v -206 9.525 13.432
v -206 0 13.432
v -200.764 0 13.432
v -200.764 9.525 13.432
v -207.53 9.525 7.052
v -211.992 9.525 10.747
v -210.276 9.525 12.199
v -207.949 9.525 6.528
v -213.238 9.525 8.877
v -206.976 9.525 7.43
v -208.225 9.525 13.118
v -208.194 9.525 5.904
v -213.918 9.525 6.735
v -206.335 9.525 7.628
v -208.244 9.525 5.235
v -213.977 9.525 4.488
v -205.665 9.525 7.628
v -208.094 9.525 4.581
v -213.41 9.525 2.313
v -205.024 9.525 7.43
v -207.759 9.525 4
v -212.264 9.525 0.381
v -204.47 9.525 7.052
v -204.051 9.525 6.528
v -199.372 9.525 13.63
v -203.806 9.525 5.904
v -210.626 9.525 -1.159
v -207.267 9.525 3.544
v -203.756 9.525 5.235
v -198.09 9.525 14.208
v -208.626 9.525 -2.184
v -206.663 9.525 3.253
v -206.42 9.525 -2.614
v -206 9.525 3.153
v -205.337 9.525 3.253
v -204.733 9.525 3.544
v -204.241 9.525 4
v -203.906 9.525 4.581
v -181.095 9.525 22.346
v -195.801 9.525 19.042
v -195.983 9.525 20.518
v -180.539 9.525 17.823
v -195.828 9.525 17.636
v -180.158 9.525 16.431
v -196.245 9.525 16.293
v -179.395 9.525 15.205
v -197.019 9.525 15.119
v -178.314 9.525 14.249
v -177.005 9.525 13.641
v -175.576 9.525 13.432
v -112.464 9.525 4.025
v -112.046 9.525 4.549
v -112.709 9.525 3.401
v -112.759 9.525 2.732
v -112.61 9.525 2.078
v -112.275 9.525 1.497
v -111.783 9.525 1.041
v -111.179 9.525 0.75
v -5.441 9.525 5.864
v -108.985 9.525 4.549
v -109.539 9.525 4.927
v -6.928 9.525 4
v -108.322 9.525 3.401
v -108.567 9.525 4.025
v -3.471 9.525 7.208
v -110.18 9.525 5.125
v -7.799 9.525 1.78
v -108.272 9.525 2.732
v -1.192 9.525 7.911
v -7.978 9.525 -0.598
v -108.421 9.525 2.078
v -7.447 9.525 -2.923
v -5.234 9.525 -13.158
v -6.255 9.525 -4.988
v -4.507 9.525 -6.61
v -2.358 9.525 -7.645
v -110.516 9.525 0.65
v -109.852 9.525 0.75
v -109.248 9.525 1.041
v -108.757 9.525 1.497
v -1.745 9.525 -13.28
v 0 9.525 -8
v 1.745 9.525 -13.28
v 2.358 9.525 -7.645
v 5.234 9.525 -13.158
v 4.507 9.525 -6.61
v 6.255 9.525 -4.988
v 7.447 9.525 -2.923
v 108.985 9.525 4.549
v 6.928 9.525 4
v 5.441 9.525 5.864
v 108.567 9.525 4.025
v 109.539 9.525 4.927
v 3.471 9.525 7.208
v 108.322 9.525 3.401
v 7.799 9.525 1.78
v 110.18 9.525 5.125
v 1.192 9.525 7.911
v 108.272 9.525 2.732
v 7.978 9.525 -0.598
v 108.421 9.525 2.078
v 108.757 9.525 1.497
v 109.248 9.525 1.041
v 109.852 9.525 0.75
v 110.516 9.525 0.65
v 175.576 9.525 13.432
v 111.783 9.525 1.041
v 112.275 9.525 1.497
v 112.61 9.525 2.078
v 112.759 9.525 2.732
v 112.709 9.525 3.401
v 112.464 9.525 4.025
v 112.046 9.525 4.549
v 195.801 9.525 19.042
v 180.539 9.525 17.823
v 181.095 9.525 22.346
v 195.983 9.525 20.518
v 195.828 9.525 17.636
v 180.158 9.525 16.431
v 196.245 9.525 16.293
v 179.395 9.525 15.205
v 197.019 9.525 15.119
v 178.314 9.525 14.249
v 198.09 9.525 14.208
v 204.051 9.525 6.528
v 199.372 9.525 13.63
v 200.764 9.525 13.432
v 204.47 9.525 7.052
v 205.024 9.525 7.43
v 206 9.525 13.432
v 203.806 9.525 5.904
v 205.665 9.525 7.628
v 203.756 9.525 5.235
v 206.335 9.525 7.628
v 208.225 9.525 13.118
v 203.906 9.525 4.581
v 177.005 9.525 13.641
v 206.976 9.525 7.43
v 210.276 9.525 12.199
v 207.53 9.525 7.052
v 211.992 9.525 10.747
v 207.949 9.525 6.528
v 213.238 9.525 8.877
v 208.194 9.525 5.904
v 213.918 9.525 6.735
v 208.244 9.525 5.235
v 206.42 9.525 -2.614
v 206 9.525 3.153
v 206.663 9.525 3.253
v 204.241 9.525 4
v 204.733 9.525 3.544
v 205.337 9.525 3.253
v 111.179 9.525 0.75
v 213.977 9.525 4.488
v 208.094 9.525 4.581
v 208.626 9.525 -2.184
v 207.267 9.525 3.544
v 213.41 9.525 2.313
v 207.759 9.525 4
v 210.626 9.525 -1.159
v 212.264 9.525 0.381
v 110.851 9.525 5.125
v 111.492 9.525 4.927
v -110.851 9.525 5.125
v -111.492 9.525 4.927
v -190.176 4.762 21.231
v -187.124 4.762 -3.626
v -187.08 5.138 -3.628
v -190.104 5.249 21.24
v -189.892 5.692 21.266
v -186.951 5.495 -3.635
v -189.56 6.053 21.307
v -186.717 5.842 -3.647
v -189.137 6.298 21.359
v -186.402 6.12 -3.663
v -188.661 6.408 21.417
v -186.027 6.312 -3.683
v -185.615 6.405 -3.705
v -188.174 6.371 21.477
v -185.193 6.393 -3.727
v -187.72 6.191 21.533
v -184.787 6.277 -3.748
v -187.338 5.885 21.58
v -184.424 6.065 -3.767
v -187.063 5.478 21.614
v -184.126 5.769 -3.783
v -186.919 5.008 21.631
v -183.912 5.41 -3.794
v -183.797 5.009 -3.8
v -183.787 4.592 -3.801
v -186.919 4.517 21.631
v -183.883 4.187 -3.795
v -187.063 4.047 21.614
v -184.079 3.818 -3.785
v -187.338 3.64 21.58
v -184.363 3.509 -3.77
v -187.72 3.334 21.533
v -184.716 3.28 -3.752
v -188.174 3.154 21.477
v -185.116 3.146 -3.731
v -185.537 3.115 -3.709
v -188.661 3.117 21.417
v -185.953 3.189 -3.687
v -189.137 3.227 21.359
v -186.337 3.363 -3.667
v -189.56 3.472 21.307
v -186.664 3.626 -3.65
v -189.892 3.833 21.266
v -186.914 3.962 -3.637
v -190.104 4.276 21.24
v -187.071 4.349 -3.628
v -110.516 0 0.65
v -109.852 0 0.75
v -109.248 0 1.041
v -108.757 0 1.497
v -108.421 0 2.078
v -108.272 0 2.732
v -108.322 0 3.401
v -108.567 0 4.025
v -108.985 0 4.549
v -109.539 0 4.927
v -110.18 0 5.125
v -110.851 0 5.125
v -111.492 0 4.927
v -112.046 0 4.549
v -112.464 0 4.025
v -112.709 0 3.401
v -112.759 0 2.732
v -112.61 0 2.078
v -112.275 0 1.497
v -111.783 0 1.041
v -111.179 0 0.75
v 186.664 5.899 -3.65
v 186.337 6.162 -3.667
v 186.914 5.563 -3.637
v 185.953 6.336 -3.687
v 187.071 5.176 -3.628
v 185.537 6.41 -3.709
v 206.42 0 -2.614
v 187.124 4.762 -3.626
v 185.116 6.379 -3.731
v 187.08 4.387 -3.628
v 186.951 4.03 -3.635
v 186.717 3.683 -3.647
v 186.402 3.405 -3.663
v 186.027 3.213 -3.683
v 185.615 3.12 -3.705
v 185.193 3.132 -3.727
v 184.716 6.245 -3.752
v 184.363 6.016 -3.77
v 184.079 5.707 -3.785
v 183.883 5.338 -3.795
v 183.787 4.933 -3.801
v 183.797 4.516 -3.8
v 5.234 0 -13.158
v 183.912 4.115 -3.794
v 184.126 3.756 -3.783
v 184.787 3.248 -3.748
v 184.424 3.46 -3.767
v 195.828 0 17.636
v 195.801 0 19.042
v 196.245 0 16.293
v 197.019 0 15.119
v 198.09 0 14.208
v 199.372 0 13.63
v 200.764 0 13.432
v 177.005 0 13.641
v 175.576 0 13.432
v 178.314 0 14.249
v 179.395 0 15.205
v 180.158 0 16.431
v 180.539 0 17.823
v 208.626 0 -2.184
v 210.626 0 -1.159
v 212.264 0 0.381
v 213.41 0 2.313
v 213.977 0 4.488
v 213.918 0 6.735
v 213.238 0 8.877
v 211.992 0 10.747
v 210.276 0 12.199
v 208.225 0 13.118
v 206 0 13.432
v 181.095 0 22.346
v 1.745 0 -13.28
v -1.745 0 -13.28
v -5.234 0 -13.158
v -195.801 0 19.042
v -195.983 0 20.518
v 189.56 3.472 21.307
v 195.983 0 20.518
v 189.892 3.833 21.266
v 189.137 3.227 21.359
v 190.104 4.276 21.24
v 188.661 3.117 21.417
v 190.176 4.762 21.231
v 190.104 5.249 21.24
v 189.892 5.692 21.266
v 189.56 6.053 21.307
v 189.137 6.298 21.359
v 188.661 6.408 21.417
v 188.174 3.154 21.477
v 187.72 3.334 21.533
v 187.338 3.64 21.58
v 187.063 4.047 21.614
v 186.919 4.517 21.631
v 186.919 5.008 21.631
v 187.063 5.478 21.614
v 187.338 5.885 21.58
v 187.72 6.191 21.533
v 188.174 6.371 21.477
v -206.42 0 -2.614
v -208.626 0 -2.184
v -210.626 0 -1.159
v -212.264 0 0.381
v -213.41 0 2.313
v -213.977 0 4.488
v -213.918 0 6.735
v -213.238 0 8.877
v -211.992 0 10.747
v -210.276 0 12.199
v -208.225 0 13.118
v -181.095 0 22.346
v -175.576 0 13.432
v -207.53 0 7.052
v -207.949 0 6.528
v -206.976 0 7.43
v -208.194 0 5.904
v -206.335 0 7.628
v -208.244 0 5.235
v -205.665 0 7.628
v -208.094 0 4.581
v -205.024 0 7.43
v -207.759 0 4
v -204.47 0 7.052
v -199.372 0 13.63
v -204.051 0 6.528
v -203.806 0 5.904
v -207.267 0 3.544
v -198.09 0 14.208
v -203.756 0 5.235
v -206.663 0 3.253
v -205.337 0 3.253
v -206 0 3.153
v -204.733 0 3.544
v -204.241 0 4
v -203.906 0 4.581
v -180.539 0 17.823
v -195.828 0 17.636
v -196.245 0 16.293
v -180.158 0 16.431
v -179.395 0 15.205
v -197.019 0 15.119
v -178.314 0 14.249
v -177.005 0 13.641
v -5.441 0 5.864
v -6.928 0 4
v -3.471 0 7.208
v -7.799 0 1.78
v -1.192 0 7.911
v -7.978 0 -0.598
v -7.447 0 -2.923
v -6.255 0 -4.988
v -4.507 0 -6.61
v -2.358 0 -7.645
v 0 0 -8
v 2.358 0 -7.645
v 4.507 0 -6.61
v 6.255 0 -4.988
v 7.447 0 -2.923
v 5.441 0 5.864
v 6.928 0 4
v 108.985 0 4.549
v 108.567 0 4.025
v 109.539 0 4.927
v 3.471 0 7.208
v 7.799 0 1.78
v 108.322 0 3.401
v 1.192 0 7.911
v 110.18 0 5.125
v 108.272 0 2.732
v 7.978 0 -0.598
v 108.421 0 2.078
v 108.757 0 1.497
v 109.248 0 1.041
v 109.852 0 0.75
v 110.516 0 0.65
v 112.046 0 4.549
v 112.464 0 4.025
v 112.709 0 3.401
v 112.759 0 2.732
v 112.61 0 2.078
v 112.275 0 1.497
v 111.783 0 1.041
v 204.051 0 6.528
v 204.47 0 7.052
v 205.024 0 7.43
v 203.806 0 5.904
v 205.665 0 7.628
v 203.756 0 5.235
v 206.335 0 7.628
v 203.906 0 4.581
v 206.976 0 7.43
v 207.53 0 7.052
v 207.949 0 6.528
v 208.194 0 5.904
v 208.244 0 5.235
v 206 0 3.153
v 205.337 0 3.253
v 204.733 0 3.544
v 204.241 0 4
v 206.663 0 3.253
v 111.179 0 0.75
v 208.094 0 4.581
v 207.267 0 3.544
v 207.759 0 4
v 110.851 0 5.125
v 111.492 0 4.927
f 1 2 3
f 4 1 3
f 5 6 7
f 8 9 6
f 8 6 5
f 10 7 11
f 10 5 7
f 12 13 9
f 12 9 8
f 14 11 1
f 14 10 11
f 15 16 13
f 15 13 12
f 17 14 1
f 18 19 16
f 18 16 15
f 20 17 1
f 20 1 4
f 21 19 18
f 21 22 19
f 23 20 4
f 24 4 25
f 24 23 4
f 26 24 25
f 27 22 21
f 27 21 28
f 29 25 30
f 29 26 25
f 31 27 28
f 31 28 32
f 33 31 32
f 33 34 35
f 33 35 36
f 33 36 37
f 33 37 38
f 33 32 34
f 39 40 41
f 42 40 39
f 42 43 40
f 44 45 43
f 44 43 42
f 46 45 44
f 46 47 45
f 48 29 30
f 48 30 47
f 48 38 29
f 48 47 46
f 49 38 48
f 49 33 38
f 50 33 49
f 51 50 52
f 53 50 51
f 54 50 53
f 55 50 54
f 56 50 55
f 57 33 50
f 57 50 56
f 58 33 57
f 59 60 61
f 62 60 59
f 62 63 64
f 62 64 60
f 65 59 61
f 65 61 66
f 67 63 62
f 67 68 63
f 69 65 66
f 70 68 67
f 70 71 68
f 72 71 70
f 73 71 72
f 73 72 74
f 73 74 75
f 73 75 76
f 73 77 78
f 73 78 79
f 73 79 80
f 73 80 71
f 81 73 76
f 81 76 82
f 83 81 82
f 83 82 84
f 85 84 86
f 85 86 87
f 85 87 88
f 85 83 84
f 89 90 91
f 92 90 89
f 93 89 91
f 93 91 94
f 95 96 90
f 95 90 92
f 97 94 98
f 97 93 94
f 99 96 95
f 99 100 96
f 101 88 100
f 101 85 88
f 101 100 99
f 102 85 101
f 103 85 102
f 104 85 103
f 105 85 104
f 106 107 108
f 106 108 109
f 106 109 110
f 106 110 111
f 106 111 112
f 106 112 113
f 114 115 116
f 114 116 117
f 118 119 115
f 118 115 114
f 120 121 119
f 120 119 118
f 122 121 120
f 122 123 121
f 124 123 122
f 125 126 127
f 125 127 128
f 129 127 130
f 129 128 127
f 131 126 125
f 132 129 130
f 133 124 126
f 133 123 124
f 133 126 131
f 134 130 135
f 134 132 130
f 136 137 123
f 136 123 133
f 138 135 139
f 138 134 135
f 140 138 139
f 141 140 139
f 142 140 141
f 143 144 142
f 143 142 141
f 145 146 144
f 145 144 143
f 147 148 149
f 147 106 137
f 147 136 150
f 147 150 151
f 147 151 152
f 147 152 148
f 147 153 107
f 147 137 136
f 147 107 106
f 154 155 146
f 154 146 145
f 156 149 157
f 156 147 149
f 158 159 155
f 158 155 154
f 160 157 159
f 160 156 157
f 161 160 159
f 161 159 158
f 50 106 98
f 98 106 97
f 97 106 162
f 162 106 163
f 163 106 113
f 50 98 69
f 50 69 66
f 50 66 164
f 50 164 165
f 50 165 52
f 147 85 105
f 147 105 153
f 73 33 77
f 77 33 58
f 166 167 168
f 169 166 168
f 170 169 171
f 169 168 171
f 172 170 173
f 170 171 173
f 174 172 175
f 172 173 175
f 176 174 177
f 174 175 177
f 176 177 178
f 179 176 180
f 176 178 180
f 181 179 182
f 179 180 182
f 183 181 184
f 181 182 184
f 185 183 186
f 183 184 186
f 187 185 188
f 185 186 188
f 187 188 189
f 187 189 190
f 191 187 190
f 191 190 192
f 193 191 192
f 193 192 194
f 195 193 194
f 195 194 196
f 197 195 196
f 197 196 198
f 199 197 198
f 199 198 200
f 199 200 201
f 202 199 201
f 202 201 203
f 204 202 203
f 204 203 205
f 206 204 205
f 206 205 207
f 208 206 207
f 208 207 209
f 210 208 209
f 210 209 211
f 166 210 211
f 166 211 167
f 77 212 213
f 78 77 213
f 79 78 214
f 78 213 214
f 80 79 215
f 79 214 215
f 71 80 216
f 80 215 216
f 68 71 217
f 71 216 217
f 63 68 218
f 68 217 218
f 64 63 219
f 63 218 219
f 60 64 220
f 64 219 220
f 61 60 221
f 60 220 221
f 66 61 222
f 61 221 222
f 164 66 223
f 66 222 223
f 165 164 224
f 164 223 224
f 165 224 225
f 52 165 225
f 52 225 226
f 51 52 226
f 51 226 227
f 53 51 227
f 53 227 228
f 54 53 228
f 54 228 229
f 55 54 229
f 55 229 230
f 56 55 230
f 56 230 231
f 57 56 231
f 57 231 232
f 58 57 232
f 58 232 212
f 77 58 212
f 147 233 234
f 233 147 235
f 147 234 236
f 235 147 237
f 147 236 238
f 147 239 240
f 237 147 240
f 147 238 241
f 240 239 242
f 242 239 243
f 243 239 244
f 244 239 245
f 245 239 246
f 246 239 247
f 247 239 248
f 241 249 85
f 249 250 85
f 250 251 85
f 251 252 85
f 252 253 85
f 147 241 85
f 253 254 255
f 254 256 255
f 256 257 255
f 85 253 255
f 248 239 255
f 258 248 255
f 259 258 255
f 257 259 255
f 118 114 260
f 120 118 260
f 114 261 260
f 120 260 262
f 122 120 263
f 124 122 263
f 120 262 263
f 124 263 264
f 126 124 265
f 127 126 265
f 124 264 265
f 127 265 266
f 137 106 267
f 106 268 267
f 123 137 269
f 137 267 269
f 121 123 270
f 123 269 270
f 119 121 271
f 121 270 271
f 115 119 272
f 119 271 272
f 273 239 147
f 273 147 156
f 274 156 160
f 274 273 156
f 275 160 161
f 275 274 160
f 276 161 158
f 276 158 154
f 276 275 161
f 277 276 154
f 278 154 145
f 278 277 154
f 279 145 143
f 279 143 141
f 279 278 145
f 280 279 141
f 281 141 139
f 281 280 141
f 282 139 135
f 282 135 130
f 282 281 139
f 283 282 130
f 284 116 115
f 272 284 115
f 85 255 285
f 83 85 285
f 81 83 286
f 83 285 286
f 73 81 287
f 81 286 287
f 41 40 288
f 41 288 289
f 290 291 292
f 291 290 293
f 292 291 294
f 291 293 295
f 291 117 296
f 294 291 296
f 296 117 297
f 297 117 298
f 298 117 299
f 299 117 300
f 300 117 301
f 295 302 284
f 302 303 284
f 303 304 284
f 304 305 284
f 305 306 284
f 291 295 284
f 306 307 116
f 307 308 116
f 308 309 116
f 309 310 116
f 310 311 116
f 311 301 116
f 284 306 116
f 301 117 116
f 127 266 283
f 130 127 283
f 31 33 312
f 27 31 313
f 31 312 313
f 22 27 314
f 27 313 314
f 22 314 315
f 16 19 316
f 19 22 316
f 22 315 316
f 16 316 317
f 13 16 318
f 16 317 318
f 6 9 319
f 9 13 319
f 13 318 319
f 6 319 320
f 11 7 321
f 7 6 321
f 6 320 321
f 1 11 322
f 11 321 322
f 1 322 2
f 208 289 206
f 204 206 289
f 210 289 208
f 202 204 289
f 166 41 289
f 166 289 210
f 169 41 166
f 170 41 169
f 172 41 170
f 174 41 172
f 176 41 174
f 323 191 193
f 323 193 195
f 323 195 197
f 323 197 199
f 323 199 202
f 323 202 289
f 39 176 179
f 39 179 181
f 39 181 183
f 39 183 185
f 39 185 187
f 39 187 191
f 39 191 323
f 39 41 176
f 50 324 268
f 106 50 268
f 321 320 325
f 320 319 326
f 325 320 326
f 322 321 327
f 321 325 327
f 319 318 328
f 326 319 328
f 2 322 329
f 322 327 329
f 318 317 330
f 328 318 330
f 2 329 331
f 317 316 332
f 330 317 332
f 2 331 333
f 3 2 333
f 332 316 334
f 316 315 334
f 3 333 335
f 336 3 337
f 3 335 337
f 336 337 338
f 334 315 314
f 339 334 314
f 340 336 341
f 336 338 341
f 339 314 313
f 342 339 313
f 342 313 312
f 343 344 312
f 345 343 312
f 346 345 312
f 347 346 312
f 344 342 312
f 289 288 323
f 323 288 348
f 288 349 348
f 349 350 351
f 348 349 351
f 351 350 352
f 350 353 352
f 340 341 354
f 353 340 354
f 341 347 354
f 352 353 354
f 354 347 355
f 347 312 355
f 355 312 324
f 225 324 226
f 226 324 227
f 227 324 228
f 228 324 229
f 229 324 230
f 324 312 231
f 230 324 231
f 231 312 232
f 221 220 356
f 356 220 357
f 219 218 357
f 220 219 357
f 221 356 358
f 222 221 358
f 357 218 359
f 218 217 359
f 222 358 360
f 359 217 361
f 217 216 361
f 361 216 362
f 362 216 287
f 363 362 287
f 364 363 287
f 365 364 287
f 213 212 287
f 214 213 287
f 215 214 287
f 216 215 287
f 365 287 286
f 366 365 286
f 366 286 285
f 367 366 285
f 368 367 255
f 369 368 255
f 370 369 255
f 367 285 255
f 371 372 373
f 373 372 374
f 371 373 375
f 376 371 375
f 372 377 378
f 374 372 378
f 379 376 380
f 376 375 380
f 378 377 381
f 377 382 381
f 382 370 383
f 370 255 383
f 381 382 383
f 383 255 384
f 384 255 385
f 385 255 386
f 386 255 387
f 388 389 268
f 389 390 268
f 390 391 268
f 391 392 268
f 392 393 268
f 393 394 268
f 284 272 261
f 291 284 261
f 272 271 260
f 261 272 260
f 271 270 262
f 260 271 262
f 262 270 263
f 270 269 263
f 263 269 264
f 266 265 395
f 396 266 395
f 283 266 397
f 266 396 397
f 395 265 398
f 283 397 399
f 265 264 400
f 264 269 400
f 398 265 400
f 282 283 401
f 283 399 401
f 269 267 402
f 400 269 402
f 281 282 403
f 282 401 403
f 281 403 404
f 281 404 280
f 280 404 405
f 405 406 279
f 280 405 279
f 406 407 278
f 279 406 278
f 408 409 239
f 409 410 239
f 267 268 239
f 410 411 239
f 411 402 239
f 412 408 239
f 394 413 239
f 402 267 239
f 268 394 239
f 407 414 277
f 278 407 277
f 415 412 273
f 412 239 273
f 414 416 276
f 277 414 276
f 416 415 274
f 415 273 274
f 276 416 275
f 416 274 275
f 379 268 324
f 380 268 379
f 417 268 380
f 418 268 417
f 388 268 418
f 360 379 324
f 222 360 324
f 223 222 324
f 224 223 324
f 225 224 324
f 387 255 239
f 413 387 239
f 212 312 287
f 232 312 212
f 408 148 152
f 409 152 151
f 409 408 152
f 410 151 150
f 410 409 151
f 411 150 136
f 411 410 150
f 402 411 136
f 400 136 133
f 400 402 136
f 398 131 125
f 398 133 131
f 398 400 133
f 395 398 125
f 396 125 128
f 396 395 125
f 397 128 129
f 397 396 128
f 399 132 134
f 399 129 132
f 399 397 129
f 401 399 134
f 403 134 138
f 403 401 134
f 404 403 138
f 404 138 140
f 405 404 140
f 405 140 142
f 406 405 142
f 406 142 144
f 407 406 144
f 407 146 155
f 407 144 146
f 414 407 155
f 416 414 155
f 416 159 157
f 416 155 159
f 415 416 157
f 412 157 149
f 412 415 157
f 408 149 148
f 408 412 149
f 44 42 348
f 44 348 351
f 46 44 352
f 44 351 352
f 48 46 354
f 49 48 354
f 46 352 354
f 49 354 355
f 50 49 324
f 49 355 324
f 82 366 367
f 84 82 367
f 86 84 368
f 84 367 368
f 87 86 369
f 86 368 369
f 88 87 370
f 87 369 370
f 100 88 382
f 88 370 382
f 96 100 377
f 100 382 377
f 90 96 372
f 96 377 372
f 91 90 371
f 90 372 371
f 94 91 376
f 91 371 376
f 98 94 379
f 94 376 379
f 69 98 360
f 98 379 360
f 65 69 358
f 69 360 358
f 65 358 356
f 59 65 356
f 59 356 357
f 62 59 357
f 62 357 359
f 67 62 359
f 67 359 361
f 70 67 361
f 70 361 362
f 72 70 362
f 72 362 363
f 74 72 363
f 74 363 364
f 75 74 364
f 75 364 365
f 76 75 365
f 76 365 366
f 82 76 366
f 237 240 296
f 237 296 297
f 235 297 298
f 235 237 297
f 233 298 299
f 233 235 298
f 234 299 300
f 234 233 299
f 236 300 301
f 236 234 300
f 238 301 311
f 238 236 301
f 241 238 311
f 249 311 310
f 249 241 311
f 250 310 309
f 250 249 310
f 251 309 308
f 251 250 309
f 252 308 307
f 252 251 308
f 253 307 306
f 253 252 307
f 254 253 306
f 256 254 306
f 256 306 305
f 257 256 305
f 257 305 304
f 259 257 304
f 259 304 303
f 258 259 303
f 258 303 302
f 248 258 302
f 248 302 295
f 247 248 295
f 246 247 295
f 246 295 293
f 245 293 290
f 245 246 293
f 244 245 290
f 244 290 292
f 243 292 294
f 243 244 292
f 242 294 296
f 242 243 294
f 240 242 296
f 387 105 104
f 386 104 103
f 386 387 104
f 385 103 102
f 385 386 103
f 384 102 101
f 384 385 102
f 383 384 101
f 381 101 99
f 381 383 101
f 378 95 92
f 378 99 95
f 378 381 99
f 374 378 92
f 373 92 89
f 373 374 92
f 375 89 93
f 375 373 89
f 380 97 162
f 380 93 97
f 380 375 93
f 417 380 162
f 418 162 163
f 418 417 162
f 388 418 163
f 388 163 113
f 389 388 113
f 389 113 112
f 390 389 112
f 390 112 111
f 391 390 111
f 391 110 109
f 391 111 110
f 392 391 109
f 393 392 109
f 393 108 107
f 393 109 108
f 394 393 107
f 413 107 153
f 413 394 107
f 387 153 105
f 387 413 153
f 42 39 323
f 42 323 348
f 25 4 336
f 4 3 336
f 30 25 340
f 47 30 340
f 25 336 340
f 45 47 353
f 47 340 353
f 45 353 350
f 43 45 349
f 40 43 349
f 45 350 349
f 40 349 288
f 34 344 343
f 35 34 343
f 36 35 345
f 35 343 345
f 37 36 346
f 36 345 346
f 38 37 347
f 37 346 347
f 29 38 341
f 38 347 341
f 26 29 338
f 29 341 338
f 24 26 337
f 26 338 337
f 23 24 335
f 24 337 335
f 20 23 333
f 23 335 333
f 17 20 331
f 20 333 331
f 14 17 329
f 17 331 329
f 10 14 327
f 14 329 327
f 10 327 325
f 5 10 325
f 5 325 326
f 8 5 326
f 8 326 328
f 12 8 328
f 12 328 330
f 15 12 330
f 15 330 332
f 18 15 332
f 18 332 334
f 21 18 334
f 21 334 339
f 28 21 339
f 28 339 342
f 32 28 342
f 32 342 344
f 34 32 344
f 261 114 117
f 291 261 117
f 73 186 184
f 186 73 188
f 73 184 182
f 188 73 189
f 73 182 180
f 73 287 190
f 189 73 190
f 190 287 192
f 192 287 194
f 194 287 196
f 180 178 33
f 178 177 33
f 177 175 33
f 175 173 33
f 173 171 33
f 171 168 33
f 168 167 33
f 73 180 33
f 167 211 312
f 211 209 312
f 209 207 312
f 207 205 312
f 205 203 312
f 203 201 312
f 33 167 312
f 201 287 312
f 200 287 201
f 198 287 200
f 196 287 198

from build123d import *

# Parameters (mm, degrees)
STOCK_UOR22_CNS_5_P_007_SWING_ARM_PLATE_START = -3.175
STOCK_UOR22_CNS_5_P_007_SWING_ARM_PL_2_R      = 2.9
STOCK_UOR22_CNS_5_P_007_SWING_ARM_PL_2_R_2    = 2.25
STOCK_UOR22_CNS_5_P_007_SWING_ARM_PL_2_R_3    = 8
STOCK_UOR22_CNS_5_P_007_SWING_ARM_PLATE_DEPTH = 3.175
BOSS_EXTRUDE2_DEPTH                           = 9.525
SKETCH5_R                                     = 8
CUT_EXTRUDE1_DEPTH                            = 235.085039959
SKETCH7_R                                     = 2.25
CUT_EXTRUDE3_DEPTH                            = 235.085039959
CUT_EXTRUDE2_DEPTH                            = 235.085039959
BOSS_EXTRUDE5_DEPTH                           = 9.525
M4_TAPPED_HOLE1_D                             = 3.3
FILLET4_R                                     = 5
FILLET4_OF_MIRROR7_R                          = 5


# Read off the part's stored shape, not the designer's step: Stock-UOR22-CNS-5-P-007_Swing_arm_plate-1
with BuildPart() as part:
    # Stock-UOR22-CNS-5-P-007_Swing_arm_pl 2 → Stock-UOR22-CNS-5-P-007_Swing_arm_plate-1 (new body)
    with BuildSketch(Plane(origin=(0, 0, 0), x_dir=(1, 0, 0), z_dir=(0, 1, 0)).offset(STOCK_UOR22_CNS_5_P_007_SWING_ARM_PLATE_START)):
        with BuildLine():
            ThreePointArc((226, -13.432371654), (233.502570944, -6.12369062), (226.392788824, 1.567628346))
            Line((226.392788824, 1.567628346), (5.233595624, 13.15809053))
            ThreePointArc((5.233595624, 13.15809053), (0, 13.295137054), (-5.233595624, 13.15809053))
            Line((-5.233595624, 13.15809053), (-226.392788824, 1.567628346))
            ThreePointArc((-226.392788824, 1.567628346), (-233.502570944, -6.12369062), (-226, -13.432371654))
            Line((-226, -13.432371654), (226, -13.432371654))
        make_face()
        with Locations((-226, -5.927228885)):
            Circle(STOCK_UOR22_CNS_5_P_007_SWING_ARM_PL_2_R, mode=Mode.SUBTRACT)
        with Locations((-206, -5.40297223)):
            Circle(STOCK_UOR22_CNS_5_P_007_SWING_ARM_PL_2_R_2, mode=Mode.SUBTRACT)
        with BuildLine():
            ThreePointArc((-200.009372106, -5.067744788), (-199.5011525, -3.620374273), (-198.117168054, -2.958743238))
            Line((-198.117168054, -2.958743238), (-118.332872644, 1.222574507))
            ThreePointArc((-118.332872644, 1.222574507), (-116.669449692, 0.478429636), (-116.300073603, -1.306027932))
            ThreePointArc((-116.300073603, -1.306027932), (-116.513571396, -3.059574073), (-116.207168794, -4.799293251))
            ThreePointArc((-116.207168794, -4.799293251), (-116.481651343, -6.601525877), (-118.104327652, -7.432371654))
            Line((-118.104327652, -7.432371654), (-198.000054021, -7.432371654))
            ThreePointArc((-198.000054021, -7.432371654), (-199.416863766, -6.843984258), (-200.000040515, -5.425021798))
            ThreePointArc((-200.000040515, -5.425021798), (-200.002045504, -5.246313796), (-200.009372106, -5.067744788))
        make_face(mode=Mode.SUBTRACT)
        with Locations((-110.515692218, -2.900058041)):
            Circle(STOCK_UOR22_CNS_5_P_007_SWING_ARM_PL_2_R_2, mode=Mode.SUBTRACT)
        with BuildLine():
            ThreePointArc((-15.423577727, 6.615822121), (-13.745275303, 5.852940228), (-13.404042587, 4.04124267))
            ThreePointArc((-13.404042587, 4.04124267), (-13.994975846, -0.375034774), (-13.168367384, -4.753325197))
            ThreePointArc((-13.168367384, -4.753325197), (-13.412783431, -6.581699085), (-15.049562725, -7.432371654))
            Line((-15.049562725, -7.432371654), (-102.927056783, -7.432371654))
            ThreePointArc((-102.927056783, -7.432371654), (-104.549733092, -6.601525877), (-104.824215641, -4.799293251))
            ThreePointArc((-104.824215641, -4.799293251), (-104.5176845, -2.745450719), (-104.929619796, -0.710127699))
            ThreePointArc((-104.929619796, -0.710127699), (-104.748793796, 1.103164739), (-103.172267568, 2.017108151))
            Line((-103.172267568, 2.017108151), (-15.423577727, 6.615822121))
        make_face(mode=Mode.SUBTRACT)
        with Locations((110.515692218, -2.900058041)):
            Circle(STOCK_UOR22_CNS_5_P_007_SWING_ARM_PL_2_R_2, mode=Mode.SUBTRACT)
        with BuildLine():
            Line((15.423577727, 6.615822121), (103.172267568, 2.017108151))
            ThreePointArc((103.172267568, 2.017108151), (104.748793796, 1.103164739), (104.929619796, -0.710127699))
            ThreePointArc((104.929619796, -0.710127699), (104.5176845, -2.745450719), (104.824215641, -4.799293251))
            ThreePointArc((104.824215641, -4.799293251), (104.549733092, -6.601525877), (102.927056783, -7.432371654))
            Line((102.927056783, -7.432371654), (15.049562725, -7.432371654))
            ThreePointArc((15.049562725, -7.432371654), (13.412783431, -6.581699085), (13.168367384, -4.753325197))
            ThreePointArc((13.168367384, -4.753325197), (13.994975846, -0.375034774), (13.404042587, 4.04124267))
            ThreePointArc((13.404042587, 4.04124267), (13.745275303, 5.852940228), (15.423577727, 6.615822121))
        make_face(mode=Mode.SUBTRACT)
        with Locations((226, -5.927228885)):
            Circle(STOCK_UOR22_CNS_5_P_007_SWING_ARM_PL_2_R, mode=Mode.SUBTRACT)
        with Locations((206, -5.40297223)):
            Circle(STOCK_UOR22_CNS_5_P_007_SWING_ARM_PL_2_R_2, mode=Mode.SUBTRACT)
        with BuildLine():
            Line((118.332872644, 1.222574507), (198.117168054, -2.958743238))
            ThreePointArc((198.117168054, -2.958743238), (199.5011525, -3.620374273), (200.009372106, -5.067744788))
            ThreePointArc((200.009372106, -5.067744788), (200.002045504, -5.246313796), (200.000040515, -5.425021798))
            ThreePointArc((200.000040515, -5.425021798), (199.416863766, -6.843984258), (198.000054021, -7.432371654))
            Line((198.000054021, -7.432371654), (118.104327652, -7.432371654))
            ThreePointArc((118.104327652, -7.432371654), (116.481651343, -6.601525877), (116.207168794, -4.799293251))
            ThreePointArc((116.207168794, -4.799293251), (116.513571396, -3.059574073), (116.300073603, -1.306027932))
            ThreePointArc((116.300073603, -1.306027932), (116.669449692, 0.478429636), (118.332872644, 1.222574507))
        make_face(mode=Mode.SUBTRACT)
        Circle(STOCK_UOR22_CNS_5_P_007_SWING_ARM_PL_2_R_3, mode=Mode.SUBTRACT)
    extrude(amount=STOCK_UOR22_CNS_5_P_007_SWING_ARM_PLATE_DEPTH)


with BuildPart() as body_2:
    # Sketch3 → Boss-Extrude2 (new body)
    with BuildSketch(Plane(origin=(0, 0, 0), x_dir=(1, 0, 0), z_dir=(0, 1, 0))):
        with BuildLine():
            Line((226.392788824, 1.567628346), (5.233595624, 13.15809053))
            ThreePointArc((5.233595624, 13.15809053), (0, 13.295137054), (-5.233595624, 13.15809053))
            Line((-5.233595624, 13.15809053), (-226.392788824, 1.567628346))
            ThreePointArc((-226.392788824, 1.567628346), (-233.502570944, -6.12369062), (-226, -13.432371654))
            Line((-226, -13.432371654), (226, -13.432371654))
            ThreePointArc((226, -13.432371654), (233.502570944, -6.12369062), (226.392788824, 1.567628346))
        make_face()
    extrude(amount=BOSS_EXTRUDE2_DEPTH)

    # Sketch5 → Cut-Extrude1 (cut, through all)
    with BuildSketch(Plane.XZ):
        with Locations(Location((0, 0, 0), (0, 0, 270))):
            Circle(SKETCH5_R)
    extrude(amount=-CUT_EXTRUDE1_DEPTH, mode=Mode.SUBTRACT)

    # Sketch7 → Cut-Extrude3 (cut, through all)
    with BuildSketch(Plane.XZ):
        with Locations(Location((-206, 5.40297223, 0), (0, 0, 270))):
            Circle(SKETCH7_R)
        with Locations(Location((-110.515692218, 2.900058041, 0), (0, 0, 270))):
            Circle(SKETCH7_R)
    cut_extrude3 = extrude(amount=-CUT_EXTRUDE3_DEPTH, mode=Mode.SUBTRACT)

    # Sketch6 → Cut-Extrude2 (cut, through all)
    with BuildSketch(Plane.XZ):
        with BuildLine():
            Line((-226.392788824, -1.567628346), (-206.420198128, -2.614347471))
            ThreePointArc((-206.420198128, -2.614347471), (-214.02610991, 5.613681539), (-206, 13.432371654))
            Line((-206, 13.432371654), (-226, 13.432371654))
            ThreePointArc((-226, 13.432371654), (-233.502570944, 6.12369062), (-226.392788824, -1.567628346))
        make_face()
    cut_extrude2 = extrude(amount=-CUT_EXTRUDE2_DEPTH, mode=Mode.SUBTRACT)

    # Mirror4: Cut-Extrude3, Cut-Extrude2 across plane
    add(cut_extrude3.mirror(Plane(origin=(0, 0, 0), x_dir=(0, 0, 1), z_dir=(1, 0, 0))), mode=Mode.SUBTRACT)
    add(cut_extrude2.mirror(Plane(origin=(0, 0, 0), x_dir=(0, 0, 1), z_dir=(1, 0, 0))), mode=Mode.SUBTRACT)

    # Sketch8 → Boss-Extrude5 (add)
    with BuildSketch(Plane(origin=(0, 9.525, 0), x_dir=(1, 0, 0), z_dir=(0, 1, 0))):
        Polygon((-180, -13.432371654), (-195.112647382, -13.432371654), (-195.982696315, -20.518351578), (-181.094504041, -22.34639173), align=None)
    boss_extrude5 = extrude(amount=-BOSS_EXTRUDE5_DEPTH)

    # M4 Tapped Hole1 (through all)
    with Locations(Plane(origin=(-5.392681082, 0, 43.919862911), x_dir=(0.992546151641322, 0, 0.12186934340514761), z_dir=(-0.12186934340514761, 0, 0.992546151641322))):
        with Locations((-184.521312982, 4.7625)):
            m4_tapped_hole1 = Hole(M4_TAPPED_HOLE1_D / 2)

    # Fillet4
    fillet4_edges = [body_2.edges().sort_by_distance(p)[0] for p in [
        (-195.112647382, 4.7625, 13.432371654),
        (-180, 4.7625, 13.432371654),
    ]]
    fillet(fillet4_edges, radius=FILLET4_R)

    # Mirror7: Boss-Extrude5, M4 Tapped Hole1 across plane
    add(boss_extrude5.mirror(Plane(origin=(0, 0, 0), x_dir=(0, 0, 1), z_dir=(1, 0, 0))))
    add(m4_tapped_hole1.mirror(Plane(origin=(0, 0, 0), x_dir=(0, 0, 1), z_dir=(1, 0, 0))), mode=Mode.SUBTRACT)

    # Fillet4 of Mirror7
    fillet4_of_mirror7_edges = [body_2.edges().sort_by_distance(p)[0] for p in [
        (195.112647382, 4.7625, 13.432371654),
        (180, 4.7625, 13.432371654),
    ]]
    fillet(fillet4_of_mirror7_edges, radius=FILLET4_OF_MIRROR7_R)


solid = body_2.part
